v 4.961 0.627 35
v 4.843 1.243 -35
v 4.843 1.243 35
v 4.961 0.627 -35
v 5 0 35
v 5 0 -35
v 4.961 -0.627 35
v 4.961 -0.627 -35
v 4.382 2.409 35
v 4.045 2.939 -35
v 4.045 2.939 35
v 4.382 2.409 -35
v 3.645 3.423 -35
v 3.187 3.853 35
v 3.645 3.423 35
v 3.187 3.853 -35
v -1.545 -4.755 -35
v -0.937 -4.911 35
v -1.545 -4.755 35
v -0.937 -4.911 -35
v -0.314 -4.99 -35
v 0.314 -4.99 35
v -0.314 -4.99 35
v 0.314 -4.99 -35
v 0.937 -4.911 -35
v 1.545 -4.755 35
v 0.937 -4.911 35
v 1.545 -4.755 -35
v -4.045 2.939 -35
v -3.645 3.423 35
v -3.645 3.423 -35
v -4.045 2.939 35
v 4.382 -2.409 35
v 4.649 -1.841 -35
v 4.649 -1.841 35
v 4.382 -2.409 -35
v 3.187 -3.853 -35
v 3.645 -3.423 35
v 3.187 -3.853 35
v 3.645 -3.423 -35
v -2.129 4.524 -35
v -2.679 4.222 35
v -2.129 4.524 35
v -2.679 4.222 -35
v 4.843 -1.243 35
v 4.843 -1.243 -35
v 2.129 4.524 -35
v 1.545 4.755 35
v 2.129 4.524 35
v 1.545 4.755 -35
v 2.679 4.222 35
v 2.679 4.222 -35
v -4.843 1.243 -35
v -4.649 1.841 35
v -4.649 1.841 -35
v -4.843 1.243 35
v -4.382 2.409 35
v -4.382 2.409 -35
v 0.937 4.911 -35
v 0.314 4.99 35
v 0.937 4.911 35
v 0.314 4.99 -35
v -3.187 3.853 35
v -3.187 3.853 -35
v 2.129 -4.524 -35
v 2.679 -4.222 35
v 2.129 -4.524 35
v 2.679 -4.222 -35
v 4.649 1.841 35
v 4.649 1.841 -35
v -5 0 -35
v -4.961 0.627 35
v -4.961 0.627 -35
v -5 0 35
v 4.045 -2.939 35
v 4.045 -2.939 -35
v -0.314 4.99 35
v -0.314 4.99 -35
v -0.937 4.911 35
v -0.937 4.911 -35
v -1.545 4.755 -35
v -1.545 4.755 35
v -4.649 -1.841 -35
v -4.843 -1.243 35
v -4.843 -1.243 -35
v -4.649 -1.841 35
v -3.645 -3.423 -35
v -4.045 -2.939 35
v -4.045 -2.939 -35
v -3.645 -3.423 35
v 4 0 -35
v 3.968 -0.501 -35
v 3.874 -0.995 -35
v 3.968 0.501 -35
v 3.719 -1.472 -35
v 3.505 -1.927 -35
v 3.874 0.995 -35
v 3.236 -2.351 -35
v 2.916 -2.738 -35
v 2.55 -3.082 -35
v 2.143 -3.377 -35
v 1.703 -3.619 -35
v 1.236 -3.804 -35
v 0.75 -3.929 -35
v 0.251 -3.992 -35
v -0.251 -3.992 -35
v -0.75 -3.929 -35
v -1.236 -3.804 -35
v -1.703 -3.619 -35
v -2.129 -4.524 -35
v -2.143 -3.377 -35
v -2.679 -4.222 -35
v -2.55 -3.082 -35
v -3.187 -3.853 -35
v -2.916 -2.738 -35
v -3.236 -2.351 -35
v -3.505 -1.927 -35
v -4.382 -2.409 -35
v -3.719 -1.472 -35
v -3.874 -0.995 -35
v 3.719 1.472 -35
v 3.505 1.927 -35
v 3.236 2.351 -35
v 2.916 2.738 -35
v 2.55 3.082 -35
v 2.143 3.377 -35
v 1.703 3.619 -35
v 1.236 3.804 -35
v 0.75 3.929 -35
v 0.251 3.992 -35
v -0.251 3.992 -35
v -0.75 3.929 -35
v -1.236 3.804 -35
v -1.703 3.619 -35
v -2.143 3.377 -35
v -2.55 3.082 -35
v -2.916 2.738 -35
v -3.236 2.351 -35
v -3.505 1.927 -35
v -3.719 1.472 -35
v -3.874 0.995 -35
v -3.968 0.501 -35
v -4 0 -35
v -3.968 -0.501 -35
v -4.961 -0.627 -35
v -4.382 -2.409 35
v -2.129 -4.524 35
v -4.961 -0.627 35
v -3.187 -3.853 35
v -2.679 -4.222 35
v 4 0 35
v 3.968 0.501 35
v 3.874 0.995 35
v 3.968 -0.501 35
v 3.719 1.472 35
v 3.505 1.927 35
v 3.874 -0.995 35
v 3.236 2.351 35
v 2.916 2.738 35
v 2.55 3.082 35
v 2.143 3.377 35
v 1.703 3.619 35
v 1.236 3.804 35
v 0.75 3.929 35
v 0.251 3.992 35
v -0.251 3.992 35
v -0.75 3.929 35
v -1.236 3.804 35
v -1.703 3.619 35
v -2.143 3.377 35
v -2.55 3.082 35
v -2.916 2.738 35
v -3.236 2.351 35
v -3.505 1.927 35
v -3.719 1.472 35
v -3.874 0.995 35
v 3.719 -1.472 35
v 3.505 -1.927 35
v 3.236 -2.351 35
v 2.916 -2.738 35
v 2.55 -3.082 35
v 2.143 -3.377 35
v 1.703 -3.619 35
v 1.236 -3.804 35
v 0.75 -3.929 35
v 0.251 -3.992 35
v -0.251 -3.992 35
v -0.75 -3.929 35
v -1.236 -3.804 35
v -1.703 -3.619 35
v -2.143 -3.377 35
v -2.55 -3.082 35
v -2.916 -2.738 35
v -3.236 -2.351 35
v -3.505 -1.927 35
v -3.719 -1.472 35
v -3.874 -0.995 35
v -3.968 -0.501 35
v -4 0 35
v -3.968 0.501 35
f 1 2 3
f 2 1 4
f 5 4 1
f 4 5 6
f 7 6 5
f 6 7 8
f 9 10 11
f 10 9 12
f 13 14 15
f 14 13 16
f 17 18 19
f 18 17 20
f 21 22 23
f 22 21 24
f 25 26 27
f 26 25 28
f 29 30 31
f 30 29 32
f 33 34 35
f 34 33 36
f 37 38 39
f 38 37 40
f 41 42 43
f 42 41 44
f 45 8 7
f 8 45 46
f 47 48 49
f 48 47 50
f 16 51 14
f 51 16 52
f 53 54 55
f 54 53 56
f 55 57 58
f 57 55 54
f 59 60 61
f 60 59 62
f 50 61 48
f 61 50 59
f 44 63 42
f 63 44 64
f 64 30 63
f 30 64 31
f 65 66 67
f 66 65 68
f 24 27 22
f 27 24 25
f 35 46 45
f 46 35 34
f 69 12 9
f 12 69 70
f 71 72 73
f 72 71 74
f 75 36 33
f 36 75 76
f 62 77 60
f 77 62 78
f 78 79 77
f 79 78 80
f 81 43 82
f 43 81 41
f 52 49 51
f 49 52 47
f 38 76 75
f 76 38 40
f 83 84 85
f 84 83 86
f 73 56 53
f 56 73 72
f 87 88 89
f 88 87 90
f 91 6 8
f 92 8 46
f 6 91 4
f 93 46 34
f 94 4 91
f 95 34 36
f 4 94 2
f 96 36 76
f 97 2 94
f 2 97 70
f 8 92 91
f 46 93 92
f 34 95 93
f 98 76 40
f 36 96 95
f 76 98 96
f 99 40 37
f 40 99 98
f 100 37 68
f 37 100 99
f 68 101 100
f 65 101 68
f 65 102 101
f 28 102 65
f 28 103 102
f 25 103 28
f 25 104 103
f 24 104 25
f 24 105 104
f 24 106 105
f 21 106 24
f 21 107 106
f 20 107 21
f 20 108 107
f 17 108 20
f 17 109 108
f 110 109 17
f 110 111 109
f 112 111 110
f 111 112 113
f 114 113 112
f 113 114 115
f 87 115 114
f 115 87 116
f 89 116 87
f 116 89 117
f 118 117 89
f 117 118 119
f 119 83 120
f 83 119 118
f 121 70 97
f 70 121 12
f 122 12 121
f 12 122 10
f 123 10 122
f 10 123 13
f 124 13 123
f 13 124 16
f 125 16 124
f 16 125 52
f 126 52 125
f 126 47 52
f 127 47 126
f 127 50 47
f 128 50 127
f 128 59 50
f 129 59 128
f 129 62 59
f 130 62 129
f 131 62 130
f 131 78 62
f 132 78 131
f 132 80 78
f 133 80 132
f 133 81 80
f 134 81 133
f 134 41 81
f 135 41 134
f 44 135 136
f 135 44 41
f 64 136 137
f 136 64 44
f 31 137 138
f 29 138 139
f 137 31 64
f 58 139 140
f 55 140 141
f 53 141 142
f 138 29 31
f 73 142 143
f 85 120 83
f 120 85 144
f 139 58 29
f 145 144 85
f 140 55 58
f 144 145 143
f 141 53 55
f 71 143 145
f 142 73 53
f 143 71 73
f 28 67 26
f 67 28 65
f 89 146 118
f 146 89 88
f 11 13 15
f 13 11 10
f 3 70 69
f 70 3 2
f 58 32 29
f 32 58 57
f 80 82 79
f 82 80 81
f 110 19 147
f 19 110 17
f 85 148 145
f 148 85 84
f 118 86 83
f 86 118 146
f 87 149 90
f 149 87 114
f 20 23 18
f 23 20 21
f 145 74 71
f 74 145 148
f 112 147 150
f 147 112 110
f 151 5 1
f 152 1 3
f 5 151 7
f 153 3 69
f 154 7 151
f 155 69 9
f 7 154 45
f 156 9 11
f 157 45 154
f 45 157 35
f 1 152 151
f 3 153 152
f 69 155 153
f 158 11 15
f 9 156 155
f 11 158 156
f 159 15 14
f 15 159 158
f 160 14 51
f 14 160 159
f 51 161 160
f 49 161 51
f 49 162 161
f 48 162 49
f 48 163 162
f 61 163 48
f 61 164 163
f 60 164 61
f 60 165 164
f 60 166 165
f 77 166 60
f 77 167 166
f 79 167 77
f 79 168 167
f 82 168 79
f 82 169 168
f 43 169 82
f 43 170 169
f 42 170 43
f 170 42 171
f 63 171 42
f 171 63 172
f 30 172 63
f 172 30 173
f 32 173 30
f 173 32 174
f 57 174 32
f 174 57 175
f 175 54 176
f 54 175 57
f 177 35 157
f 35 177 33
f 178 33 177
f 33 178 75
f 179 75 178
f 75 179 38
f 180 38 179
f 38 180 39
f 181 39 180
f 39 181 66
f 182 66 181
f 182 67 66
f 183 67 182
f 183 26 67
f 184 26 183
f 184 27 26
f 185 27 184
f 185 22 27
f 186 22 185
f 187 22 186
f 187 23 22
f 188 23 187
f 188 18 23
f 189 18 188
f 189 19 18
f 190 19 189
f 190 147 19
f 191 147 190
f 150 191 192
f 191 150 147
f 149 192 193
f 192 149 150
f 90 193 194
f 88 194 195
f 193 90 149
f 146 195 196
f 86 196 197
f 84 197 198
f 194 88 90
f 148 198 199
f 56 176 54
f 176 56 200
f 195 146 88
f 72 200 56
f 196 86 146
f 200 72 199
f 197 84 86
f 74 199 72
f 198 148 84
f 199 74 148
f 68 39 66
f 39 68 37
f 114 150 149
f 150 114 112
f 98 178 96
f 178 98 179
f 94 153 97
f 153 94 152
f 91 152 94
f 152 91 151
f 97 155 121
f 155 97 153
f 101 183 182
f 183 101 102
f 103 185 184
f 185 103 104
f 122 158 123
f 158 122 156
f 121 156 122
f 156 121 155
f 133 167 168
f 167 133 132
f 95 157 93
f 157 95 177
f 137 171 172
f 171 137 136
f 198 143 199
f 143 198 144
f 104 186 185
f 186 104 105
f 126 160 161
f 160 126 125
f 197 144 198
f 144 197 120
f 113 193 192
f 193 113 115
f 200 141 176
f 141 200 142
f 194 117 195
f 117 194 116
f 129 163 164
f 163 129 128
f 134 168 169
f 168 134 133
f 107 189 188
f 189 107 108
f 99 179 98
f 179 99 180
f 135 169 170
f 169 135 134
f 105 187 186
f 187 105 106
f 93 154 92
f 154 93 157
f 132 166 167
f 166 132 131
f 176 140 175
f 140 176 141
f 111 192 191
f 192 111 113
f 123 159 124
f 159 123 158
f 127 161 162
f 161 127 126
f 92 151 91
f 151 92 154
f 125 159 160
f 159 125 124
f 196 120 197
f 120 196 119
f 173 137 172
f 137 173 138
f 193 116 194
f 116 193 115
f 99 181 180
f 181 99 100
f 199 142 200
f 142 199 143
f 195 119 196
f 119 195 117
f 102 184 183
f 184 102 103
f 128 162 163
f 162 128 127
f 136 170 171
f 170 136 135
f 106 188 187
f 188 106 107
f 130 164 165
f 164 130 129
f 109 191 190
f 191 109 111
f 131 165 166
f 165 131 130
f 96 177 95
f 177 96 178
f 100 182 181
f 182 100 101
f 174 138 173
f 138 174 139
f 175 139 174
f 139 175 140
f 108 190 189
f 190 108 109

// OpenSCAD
$fn = 50;


difference() {
	union() {
		translate(v = [0, 0, -35.0000000000]) {
			cylinder(h = 70, r = 5.0000000000);
		}
	}
	union() {
		translate(v = [0, 0, -100.0000000000]) {
			cylinder(h = 200, r = 4.0000000000);
		}
	}
}
